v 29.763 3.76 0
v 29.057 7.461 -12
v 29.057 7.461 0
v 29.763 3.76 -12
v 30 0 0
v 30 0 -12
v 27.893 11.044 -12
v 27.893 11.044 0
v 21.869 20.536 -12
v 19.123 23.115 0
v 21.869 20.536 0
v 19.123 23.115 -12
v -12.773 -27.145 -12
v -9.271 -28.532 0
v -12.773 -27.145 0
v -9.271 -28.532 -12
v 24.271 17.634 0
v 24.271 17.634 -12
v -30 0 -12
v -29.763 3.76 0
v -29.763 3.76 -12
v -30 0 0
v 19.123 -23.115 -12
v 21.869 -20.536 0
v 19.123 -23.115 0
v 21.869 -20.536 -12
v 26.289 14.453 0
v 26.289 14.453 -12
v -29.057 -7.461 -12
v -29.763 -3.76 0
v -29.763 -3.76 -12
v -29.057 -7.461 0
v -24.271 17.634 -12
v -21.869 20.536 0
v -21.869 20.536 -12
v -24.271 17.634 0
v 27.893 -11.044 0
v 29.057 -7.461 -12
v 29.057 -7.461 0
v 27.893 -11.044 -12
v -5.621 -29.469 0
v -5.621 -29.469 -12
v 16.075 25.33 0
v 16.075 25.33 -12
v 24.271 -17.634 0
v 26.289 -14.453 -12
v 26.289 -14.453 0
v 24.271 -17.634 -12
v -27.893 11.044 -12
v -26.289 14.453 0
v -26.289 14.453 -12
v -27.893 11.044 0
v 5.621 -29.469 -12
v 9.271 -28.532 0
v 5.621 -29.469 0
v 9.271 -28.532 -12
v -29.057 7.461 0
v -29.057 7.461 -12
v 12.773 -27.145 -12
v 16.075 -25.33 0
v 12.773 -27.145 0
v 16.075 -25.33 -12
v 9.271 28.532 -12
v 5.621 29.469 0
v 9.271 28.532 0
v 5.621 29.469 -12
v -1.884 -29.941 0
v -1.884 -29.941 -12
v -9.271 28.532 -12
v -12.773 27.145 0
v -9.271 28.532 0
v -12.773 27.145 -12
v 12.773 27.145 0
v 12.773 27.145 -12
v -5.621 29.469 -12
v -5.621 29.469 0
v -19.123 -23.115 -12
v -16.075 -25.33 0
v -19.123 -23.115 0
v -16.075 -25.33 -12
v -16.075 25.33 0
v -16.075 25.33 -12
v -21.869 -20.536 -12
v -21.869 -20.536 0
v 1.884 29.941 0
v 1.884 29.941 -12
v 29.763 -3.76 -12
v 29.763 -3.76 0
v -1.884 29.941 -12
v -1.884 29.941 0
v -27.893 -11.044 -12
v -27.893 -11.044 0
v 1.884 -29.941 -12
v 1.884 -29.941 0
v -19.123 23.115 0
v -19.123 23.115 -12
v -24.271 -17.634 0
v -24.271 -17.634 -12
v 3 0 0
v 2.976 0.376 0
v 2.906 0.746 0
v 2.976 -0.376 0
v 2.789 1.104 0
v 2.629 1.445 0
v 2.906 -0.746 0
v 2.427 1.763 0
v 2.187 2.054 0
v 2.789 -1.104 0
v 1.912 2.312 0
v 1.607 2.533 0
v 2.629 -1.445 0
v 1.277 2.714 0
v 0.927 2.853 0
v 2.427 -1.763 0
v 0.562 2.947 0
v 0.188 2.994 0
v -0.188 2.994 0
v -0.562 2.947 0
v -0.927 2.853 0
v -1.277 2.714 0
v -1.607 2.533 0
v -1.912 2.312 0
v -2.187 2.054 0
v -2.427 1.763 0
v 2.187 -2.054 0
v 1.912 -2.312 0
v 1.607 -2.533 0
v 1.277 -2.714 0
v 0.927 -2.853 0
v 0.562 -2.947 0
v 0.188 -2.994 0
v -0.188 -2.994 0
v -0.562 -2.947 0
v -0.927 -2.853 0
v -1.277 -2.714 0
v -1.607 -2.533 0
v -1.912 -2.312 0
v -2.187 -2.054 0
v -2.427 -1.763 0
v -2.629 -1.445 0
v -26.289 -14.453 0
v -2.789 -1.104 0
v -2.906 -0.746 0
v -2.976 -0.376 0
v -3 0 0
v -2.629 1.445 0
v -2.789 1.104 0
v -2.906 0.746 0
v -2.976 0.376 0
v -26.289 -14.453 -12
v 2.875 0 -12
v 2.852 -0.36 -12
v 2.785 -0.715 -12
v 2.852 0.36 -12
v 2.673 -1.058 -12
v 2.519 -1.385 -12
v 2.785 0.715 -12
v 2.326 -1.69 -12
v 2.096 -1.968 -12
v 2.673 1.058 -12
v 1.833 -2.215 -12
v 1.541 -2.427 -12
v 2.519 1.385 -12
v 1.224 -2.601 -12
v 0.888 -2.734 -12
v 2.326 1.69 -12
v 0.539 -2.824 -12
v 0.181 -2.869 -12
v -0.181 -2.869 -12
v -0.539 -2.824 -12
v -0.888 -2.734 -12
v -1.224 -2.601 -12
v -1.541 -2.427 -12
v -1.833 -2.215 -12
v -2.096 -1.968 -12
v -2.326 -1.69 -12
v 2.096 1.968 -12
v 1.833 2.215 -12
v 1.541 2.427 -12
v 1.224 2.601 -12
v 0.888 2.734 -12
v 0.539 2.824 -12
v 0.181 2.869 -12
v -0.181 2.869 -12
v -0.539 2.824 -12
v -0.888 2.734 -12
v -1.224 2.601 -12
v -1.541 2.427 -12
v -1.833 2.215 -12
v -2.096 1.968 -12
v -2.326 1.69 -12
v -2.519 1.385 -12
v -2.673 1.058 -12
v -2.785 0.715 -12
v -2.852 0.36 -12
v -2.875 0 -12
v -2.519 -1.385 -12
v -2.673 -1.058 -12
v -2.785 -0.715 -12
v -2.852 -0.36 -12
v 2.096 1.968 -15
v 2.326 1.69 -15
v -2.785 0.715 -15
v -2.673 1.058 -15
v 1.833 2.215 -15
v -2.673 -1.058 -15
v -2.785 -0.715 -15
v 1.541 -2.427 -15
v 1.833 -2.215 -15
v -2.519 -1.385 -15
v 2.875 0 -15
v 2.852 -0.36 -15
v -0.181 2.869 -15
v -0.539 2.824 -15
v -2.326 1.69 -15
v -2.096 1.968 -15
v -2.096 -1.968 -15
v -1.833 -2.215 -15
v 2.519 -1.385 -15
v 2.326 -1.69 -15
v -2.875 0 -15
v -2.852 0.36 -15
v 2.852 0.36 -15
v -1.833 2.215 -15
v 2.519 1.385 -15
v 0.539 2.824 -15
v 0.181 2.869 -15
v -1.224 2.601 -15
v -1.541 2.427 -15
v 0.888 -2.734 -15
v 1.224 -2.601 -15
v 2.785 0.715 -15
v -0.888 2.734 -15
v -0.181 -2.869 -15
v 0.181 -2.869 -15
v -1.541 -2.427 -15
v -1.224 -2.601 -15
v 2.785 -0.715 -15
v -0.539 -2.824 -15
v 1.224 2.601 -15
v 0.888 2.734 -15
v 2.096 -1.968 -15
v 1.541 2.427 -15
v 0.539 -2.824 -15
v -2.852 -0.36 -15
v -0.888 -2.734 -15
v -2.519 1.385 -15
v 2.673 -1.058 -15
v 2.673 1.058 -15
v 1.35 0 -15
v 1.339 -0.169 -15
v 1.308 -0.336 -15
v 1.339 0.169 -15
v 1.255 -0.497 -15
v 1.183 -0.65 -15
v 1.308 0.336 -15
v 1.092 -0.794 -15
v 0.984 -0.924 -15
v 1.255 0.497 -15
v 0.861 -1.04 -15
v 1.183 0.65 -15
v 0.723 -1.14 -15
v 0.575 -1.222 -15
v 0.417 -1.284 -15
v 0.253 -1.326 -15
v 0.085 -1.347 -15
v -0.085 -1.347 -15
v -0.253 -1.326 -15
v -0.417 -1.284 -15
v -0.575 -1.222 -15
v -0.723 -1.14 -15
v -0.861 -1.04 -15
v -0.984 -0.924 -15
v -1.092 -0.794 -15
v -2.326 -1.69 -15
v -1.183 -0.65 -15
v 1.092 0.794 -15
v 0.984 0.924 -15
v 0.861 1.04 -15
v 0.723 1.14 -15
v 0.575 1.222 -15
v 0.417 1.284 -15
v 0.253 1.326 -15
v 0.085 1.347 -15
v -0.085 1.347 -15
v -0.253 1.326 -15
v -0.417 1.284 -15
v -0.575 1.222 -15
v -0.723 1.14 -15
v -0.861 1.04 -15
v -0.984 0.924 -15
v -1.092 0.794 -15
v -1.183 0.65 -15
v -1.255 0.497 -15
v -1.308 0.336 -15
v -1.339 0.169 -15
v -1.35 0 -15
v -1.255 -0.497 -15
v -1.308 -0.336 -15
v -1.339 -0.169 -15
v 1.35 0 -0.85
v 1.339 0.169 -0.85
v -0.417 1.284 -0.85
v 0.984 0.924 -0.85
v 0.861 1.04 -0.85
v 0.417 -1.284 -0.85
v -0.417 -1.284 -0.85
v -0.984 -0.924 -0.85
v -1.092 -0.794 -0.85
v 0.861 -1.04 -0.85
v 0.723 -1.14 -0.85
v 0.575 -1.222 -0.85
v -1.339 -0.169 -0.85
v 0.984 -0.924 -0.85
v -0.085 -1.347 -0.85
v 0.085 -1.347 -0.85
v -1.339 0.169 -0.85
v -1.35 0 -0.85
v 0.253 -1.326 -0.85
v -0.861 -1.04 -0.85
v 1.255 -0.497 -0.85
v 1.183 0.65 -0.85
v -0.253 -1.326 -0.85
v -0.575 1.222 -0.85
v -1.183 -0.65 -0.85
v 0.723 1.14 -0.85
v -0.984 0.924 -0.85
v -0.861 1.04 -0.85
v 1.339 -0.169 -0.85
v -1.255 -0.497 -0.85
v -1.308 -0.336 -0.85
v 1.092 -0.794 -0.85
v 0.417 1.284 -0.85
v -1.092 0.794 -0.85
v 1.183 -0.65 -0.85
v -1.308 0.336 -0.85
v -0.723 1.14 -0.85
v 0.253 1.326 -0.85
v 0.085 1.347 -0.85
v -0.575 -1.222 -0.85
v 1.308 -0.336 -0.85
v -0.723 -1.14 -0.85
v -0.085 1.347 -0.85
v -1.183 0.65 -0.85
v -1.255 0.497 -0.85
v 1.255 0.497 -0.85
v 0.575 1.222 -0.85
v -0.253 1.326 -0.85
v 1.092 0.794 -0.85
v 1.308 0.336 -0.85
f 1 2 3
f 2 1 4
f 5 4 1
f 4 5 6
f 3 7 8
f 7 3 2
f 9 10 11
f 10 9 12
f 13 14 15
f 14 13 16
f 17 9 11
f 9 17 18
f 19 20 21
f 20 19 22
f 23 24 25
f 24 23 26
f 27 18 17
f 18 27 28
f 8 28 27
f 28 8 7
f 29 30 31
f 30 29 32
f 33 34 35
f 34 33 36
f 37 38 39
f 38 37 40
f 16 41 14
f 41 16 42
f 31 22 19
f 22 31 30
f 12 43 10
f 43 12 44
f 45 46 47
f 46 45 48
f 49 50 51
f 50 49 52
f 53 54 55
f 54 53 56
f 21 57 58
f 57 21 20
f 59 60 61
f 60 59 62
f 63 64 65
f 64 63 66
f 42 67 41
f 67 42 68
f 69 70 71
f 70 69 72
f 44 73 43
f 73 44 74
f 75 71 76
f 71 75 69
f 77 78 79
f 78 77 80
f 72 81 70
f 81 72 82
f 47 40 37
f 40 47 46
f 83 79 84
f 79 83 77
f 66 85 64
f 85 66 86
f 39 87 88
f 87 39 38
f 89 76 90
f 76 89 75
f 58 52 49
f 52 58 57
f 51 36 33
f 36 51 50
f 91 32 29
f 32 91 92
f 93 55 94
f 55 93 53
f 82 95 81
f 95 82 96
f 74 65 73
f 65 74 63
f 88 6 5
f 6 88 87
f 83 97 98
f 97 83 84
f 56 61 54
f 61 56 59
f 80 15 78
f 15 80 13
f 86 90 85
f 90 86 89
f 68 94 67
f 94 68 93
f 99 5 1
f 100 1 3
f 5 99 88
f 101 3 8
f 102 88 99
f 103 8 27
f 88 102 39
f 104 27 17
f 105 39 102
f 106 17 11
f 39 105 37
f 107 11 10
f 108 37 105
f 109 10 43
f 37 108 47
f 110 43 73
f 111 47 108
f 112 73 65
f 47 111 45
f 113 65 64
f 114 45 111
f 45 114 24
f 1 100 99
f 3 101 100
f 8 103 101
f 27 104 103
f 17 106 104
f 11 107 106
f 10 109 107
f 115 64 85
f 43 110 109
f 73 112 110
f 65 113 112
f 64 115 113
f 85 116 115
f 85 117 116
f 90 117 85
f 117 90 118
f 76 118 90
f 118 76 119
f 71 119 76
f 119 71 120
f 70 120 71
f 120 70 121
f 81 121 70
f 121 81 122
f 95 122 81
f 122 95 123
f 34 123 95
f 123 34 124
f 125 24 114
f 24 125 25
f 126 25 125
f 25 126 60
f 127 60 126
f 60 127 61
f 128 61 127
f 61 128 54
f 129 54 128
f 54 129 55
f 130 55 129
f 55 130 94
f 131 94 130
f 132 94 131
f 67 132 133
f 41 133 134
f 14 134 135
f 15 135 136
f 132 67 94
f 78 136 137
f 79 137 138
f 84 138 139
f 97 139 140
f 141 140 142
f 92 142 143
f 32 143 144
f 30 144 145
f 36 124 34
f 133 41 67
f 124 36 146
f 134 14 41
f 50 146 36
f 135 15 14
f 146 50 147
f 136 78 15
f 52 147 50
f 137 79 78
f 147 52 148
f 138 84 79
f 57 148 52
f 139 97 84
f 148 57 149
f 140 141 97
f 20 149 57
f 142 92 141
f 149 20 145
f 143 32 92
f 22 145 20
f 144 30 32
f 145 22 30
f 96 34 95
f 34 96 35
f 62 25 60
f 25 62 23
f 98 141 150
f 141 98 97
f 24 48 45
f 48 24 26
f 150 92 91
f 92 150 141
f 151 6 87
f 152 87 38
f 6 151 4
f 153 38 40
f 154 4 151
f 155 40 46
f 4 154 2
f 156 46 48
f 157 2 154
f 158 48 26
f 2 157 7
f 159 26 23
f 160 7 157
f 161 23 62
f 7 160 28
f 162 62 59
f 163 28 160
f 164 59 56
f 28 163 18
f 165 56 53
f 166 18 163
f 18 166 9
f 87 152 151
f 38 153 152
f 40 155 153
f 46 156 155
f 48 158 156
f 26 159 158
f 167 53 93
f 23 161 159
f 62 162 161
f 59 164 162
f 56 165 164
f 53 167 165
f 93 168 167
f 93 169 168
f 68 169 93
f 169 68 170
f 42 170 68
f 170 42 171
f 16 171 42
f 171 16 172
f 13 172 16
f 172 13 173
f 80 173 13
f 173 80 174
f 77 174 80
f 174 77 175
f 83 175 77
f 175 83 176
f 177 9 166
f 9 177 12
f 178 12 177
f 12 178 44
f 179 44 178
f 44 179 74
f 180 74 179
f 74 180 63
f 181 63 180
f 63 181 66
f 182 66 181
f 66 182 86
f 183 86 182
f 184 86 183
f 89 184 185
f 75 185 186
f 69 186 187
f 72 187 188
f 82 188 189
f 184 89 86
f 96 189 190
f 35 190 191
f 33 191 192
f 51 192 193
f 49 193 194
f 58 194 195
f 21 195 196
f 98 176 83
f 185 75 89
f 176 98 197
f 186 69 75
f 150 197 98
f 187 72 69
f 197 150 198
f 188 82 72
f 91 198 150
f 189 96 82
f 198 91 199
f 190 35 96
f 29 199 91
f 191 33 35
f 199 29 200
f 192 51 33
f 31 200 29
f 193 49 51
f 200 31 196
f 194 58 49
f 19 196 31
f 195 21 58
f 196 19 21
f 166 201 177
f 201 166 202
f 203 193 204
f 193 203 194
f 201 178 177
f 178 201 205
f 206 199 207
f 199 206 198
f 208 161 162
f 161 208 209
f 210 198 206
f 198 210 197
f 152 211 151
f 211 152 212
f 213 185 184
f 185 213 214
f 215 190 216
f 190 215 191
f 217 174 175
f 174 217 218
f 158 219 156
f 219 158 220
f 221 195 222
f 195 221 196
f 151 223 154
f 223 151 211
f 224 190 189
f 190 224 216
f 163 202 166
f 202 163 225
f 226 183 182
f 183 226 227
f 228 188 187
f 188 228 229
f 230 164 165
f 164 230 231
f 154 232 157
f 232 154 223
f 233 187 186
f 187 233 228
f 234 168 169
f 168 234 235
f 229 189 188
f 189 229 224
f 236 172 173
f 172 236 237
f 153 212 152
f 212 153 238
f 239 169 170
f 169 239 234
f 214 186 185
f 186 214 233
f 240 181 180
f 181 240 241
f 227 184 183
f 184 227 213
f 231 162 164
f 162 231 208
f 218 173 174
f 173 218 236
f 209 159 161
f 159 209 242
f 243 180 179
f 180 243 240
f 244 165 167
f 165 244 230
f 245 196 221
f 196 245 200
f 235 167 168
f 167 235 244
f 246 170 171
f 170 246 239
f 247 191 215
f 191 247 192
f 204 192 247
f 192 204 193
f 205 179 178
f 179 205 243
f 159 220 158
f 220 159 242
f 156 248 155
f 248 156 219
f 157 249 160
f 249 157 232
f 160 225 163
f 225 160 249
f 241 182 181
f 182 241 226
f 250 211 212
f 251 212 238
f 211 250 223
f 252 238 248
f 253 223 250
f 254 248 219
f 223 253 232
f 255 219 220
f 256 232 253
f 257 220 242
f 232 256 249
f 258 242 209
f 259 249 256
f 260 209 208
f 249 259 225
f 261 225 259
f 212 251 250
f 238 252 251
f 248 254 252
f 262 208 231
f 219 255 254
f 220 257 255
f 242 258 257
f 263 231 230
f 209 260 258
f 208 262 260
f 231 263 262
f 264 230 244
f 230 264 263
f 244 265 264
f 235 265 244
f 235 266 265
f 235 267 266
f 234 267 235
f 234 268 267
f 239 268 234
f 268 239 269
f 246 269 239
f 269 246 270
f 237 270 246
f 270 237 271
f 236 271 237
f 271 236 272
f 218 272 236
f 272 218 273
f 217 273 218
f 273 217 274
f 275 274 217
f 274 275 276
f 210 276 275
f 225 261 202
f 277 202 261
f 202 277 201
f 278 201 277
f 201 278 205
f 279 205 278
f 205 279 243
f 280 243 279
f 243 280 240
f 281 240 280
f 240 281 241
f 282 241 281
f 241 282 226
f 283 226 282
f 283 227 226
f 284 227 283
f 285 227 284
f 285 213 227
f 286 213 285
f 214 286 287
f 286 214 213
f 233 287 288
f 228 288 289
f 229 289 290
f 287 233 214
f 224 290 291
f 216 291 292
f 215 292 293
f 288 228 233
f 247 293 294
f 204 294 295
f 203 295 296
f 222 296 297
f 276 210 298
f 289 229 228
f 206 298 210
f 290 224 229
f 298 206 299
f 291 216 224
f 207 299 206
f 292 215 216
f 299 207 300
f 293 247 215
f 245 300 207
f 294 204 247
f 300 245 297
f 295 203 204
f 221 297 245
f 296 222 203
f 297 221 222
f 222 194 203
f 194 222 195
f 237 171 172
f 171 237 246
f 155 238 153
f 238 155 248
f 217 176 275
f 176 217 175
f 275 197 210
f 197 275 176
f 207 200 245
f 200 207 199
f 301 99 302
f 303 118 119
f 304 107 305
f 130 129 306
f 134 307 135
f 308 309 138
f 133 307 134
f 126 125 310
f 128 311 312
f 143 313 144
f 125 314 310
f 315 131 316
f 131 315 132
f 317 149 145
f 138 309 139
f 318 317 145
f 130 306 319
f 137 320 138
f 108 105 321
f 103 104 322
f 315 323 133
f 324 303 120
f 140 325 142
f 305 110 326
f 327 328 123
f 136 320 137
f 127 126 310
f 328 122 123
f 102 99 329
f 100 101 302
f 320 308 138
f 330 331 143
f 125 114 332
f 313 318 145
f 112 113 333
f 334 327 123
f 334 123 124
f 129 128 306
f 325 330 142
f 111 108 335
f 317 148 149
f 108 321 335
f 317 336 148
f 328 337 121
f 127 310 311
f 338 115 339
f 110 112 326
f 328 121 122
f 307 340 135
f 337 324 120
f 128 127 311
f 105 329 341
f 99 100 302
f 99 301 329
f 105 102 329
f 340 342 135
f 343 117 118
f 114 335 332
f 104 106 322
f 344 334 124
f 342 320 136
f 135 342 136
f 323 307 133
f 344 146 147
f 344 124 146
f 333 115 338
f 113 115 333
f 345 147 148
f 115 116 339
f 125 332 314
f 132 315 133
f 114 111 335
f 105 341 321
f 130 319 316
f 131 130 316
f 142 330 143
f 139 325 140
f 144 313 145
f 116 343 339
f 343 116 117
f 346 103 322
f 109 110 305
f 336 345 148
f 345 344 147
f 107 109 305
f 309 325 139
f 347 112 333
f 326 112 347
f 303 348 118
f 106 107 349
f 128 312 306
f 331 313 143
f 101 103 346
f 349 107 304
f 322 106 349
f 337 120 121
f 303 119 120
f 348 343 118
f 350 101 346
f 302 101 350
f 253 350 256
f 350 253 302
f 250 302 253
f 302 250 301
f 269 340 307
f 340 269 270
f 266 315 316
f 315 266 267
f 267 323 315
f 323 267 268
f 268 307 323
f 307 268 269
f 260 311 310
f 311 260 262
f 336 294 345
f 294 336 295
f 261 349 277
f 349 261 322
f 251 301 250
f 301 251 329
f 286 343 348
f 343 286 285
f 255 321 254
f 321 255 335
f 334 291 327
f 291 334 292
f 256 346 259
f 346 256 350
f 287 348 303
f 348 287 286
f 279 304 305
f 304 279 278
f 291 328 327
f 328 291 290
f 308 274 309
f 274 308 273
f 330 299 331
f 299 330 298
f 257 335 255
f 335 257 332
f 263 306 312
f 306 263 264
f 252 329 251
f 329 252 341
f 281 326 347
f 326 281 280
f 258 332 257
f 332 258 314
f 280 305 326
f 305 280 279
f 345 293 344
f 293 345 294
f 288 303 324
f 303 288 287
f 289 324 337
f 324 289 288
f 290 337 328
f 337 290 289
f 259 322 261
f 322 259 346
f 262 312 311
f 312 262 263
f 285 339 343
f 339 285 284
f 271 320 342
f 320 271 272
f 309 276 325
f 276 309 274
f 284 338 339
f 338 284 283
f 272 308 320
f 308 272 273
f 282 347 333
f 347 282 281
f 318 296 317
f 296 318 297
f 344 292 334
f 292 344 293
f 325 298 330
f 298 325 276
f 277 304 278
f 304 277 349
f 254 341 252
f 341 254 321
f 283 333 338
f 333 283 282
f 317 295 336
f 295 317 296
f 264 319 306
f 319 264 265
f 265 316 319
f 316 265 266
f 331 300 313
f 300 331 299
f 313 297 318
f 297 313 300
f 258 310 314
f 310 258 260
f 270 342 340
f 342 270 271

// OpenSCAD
$fn = 50;

difference() {
	union() {
		translate(v = [0, 0, -12.0]) {
			cylinder(h = 12, r = 30.0);
		}
		#translate(v = [0, 0, -15.0]) {
			cylinder(h = 15, r = 2.875);
		}
	}
	union() {
		translate(v = [0, 0, 0]) {
			rotate(a = [0, 0, 0]) {
				difference() {
					union() {
						translate(v = [0, 0, -15.0]) {
							cylinder(h = 15, r = 1.0);
						}
						translate(v = [0, 0, -0.85]) {
							cylinder(h = 0.85, r1 = 1.35, r2 = 3.0);
						}
						translate(v = [0, 0, -15.0]) {
							cylinder(h = 15, r = 1.35);
						}
						translate(v = [0, 0, -15.0]) {
							cylinder(h = 15, r = 1.0);
						}
					}
					union();
				}
			}
		}
	}
}
